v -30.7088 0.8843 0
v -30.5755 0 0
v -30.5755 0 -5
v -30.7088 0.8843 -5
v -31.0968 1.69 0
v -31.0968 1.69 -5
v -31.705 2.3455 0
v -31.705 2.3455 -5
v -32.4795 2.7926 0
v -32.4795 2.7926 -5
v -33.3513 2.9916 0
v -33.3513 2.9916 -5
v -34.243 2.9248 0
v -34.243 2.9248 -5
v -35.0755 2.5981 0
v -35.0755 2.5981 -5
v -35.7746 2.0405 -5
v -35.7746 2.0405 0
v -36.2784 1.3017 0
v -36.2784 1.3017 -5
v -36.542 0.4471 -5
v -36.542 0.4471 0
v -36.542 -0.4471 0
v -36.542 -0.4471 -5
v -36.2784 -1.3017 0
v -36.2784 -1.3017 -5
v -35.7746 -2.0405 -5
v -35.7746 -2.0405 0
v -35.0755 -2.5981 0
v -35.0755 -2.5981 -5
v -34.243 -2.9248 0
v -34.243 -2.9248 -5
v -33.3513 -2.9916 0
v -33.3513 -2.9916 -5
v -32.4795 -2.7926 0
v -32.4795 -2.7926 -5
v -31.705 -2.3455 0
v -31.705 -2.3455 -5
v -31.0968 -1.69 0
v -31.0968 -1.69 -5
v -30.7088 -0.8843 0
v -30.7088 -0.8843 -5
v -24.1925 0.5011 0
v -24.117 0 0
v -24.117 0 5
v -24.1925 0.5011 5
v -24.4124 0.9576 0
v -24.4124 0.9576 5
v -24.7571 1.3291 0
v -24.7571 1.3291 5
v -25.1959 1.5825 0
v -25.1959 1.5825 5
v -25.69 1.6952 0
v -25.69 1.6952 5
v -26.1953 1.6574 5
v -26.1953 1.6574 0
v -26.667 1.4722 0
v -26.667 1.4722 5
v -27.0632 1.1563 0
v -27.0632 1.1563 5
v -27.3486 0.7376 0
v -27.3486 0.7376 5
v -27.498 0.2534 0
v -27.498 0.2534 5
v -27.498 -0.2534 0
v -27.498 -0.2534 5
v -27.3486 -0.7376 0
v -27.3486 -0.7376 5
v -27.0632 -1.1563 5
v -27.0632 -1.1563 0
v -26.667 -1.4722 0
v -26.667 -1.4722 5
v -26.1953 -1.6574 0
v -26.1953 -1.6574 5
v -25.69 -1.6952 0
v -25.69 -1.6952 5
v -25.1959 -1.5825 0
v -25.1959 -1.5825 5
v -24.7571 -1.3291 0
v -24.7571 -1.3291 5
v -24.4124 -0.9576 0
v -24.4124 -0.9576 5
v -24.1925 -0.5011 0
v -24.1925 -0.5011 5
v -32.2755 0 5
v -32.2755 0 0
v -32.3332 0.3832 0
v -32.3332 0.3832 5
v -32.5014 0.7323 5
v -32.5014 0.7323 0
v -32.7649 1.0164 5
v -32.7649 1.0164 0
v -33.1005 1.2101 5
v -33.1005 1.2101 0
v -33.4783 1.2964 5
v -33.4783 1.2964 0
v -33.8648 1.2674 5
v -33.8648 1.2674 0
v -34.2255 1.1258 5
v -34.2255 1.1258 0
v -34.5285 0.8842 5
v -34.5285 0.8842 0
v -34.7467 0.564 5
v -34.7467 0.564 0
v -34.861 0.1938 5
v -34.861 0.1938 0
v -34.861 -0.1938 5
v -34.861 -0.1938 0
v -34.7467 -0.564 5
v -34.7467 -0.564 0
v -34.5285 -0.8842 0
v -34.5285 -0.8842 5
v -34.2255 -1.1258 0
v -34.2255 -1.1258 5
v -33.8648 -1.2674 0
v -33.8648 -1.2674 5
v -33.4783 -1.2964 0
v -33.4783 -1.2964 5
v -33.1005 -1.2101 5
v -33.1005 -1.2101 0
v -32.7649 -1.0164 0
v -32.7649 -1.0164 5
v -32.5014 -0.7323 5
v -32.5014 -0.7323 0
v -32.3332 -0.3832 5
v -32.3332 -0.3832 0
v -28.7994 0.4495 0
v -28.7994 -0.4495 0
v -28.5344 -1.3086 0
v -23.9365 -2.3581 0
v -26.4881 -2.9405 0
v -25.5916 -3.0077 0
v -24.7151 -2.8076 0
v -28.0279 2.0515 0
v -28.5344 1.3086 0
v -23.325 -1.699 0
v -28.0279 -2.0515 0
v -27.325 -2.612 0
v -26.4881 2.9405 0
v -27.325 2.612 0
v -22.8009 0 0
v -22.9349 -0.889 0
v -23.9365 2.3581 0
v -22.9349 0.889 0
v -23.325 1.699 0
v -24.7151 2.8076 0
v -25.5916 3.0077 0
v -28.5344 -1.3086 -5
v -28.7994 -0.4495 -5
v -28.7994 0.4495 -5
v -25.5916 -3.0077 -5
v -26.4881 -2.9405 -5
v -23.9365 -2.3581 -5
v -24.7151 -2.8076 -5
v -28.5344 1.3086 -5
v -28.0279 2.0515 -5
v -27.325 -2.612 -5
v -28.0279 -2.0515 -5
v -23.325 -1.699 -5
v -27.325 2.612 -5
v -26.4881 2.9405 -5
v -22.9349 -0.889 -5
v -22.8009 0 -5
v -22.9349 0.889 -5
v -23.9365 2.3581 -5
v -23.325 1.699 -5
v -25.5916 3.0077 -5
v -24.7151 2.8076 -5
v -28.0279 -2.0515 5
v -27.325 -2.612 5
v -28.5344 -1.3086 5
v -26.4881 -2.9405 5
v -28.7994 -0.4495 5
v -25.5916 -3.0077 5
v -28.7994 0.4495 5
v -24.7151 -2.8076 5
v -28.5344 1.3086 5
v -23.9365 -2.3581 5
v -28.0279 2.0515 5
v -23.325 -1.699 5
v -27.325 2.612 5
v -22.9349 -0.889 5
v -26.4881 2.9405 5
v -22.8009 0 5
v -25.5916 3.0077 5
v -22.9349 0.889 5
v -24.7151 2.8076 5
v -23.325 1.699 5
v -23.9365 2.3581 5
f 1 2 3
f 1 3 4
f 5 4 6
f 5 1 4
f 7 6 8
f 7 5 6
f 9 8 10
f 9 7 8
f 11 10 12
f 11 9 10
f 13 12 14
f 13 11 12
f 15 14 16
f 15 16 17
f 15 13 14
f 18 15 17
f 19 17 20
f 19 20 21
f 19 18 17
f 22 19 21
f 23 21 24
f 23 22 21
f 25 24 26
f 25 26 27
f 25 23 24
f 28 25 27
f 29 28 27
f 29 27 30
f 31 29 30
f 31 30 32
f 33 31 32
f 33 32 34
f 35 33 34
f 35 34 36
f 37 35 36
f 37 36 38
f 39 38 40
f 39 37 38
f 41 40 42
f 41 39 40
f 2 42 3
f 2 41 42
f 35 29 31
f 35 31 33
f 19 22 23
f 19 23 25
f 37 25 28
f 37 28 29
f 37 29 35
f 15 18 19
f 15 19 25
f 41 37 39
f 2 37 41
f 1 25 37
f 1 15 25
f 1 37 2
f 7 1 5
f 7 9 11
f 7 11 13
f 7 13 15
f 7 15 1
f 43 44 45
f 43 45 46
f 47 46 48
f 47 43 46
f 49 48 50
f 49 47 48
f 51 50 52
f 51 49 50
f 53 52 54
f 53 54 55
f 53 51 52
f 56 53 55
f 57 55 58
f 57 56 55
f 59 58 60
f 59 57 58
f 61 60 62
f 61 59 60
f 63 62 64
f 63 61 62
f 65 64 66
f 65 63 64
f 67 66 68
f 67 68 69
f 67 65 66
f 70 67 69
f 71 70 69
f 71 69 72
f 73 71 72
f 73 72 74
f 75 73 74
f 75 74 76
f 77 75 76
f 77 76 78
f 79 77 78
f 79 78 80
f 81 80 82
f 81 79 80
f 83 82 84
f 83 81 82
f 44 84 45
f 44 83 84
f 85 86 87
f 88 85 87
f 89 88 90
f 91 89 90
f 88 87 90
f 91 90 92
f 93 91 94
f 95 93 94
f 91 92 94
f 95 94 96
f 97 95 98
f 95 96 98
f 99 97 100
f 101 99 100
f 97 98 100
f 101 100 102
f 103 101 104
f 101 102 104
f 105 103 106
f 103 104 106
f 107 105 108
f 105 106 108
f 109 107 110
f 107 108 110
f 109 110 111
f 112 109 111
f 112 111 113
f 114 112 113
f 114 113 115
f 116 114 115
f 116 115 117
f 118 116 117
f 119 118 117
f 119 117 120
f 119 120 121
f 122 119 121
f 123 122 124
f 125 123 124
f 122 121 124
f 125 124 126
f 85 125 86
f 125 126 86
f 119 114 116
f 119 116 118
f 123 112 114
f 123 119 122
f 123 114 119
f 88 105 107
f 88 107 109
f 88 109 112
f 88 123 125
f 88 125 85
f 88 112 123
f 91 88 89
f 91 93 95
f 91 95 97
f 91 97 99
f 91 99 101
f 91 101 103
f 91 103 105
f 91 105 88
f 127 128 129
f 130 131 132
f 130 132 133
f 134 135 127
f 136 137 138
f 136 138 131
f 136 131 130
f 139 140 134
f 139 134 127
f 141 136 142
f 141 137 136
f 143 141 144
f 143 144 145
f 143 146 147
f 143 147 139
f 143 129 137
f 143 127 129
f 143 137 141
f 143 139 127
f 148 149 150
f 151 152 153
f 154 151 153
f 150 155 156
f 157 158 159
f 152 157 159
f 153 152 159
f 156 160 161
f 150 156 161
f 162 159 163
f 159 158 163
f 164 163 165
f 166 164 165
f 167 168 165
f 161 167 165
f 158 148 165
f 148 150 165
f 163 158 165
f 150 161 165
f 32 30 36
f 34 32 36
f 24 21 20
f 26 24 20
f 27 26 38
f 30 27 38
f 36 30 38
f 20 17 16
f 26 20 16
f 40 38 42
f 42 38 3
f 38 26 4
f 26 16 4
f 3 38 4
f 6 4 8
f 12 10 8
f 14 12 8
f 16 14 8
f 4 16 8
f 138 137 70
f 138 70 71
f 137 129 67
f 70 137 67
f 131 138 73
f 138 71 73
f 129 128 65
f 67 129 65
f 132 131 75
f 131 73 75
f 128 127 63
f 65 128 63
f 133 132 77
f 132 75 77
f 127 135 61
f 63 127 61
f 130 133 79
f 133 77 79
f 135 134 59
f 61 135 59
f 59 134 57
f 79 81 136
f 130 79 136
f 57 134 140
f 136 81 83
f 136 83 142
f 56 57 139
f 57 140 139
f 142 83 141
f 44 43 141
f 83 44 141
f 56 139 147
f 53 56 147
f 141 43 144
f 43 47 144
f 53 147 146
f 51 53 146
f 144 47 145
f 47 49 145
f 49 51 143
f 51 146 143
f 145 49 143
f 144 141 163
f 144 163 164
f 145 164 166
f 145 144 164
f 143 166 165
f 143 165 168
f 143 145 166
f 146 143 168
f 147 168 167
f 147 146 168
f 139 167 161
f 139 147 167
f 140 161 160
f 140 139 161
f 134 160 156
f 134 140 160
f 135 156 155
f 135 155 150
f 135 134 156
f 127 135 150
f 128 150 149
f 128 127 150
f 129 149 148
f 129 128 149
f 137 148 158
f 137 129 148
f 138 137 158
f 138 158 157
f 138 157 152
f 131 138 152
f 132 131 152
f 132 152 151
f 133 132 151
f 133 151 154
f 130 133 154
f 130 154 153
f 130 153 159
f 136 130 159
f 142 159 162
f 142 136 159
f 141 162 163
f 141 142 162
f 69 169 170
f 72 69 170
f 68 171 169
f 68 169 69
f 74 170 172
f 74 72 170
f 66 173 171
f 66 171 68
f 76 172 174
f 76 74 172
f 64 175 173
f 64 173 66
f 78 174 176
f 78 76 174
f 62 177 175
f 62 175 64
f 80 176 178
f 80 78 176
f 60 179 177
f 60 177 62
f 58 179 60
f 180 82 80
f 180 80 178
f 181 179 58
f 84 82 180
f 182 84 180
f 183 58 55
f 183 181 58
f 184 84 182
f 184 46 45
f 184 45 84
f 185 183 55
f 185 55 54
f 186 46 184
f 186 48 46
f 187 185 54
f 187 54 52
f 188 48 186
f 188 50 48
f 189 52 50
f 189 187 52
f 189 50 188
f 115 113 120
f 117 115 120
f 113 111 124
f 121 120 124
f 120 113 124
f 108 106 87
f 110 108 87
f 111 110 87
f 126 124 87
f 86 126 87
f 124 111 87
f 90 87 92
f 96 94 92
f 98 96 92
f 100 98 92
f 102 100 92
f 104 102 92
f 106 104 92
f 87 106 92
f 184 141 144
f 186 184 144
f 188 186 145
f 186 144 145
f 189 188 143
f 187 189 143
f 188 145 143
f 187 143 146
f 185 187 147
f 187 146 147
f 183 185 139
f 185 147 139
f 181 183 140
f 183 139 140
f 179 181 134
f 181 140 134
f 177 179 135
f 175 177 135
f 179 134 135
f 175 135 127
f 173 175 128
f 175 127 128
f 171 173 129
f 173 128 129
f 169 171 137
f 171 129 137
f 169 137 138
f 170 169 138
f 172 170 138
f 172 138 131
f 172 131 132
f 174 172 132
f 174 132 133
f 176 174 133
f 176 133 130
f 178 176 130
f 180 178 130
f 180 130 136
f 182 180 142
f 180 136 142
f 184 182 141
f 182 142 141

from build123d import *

# Parameters (mm, degrees)
F0_R     = 3
F0_R_2   = 1.3
F1_DEPTH = 5
F0_R_3   = 3.0160842828
F0_R_4   = 1.7
F2_DEPTH = 5


with BuildPart() as f1:
    # F0 (on Top) → F1 (new body)
    with BuildSketch(Plane.XY):
        with Locations((-33.5754850469, 0)):
            Circle(F0_R)
        with Locations((-33.5754850469, 0)):
            Circle(F0_R_2, mode=Mode.SUBTRACT)
        with Locations((-33.5754850469, 0)):
            Circle(F0_R_2)
    extrude(amount=-F1_DEPTH)


with BuildPart() as f1b:
    # F0 (on Top) → F1, piece 2 (new body)
    with BuildSketch(Plane.XY):
        with Locations((-25.8169919252, 0)):
            Circle(F0_R_3)
        with Locations((-25.8169919252, 0)):
            Circle(F0_R_4, mode=Mode.SUBTRACT)
        with Locations((-25.8169919252, 0)):
            Circle(F0_R_4)
    extrude(amount=-F1_DEPTH)


with BuildPart() as f2:
    # F0 (on Top) → F2 (new body)
    with BuildSketch(Plane.XY):
        with Locations((-25.8169919252, 0)):
            Circle(F0_R_3)
        with Locations((-25.8169919252, 0)):
            Circle(F0_R_4, mode=Mode.SUBTRACT)
    extrude(amount=F2_DEPTH)


with BuildPart() as f2b:
    # F0 (on Top) → F2, piece 2 (new body)
    with BuildSketch(Plane.XY):
        with Locations((-33.5754850469, 0)):
            Circle(F0_R_2)
    extrude(amount=F2_DEPTH)


solid = Compound([f1.part, f1b.part, f2.part, f2b.part])
